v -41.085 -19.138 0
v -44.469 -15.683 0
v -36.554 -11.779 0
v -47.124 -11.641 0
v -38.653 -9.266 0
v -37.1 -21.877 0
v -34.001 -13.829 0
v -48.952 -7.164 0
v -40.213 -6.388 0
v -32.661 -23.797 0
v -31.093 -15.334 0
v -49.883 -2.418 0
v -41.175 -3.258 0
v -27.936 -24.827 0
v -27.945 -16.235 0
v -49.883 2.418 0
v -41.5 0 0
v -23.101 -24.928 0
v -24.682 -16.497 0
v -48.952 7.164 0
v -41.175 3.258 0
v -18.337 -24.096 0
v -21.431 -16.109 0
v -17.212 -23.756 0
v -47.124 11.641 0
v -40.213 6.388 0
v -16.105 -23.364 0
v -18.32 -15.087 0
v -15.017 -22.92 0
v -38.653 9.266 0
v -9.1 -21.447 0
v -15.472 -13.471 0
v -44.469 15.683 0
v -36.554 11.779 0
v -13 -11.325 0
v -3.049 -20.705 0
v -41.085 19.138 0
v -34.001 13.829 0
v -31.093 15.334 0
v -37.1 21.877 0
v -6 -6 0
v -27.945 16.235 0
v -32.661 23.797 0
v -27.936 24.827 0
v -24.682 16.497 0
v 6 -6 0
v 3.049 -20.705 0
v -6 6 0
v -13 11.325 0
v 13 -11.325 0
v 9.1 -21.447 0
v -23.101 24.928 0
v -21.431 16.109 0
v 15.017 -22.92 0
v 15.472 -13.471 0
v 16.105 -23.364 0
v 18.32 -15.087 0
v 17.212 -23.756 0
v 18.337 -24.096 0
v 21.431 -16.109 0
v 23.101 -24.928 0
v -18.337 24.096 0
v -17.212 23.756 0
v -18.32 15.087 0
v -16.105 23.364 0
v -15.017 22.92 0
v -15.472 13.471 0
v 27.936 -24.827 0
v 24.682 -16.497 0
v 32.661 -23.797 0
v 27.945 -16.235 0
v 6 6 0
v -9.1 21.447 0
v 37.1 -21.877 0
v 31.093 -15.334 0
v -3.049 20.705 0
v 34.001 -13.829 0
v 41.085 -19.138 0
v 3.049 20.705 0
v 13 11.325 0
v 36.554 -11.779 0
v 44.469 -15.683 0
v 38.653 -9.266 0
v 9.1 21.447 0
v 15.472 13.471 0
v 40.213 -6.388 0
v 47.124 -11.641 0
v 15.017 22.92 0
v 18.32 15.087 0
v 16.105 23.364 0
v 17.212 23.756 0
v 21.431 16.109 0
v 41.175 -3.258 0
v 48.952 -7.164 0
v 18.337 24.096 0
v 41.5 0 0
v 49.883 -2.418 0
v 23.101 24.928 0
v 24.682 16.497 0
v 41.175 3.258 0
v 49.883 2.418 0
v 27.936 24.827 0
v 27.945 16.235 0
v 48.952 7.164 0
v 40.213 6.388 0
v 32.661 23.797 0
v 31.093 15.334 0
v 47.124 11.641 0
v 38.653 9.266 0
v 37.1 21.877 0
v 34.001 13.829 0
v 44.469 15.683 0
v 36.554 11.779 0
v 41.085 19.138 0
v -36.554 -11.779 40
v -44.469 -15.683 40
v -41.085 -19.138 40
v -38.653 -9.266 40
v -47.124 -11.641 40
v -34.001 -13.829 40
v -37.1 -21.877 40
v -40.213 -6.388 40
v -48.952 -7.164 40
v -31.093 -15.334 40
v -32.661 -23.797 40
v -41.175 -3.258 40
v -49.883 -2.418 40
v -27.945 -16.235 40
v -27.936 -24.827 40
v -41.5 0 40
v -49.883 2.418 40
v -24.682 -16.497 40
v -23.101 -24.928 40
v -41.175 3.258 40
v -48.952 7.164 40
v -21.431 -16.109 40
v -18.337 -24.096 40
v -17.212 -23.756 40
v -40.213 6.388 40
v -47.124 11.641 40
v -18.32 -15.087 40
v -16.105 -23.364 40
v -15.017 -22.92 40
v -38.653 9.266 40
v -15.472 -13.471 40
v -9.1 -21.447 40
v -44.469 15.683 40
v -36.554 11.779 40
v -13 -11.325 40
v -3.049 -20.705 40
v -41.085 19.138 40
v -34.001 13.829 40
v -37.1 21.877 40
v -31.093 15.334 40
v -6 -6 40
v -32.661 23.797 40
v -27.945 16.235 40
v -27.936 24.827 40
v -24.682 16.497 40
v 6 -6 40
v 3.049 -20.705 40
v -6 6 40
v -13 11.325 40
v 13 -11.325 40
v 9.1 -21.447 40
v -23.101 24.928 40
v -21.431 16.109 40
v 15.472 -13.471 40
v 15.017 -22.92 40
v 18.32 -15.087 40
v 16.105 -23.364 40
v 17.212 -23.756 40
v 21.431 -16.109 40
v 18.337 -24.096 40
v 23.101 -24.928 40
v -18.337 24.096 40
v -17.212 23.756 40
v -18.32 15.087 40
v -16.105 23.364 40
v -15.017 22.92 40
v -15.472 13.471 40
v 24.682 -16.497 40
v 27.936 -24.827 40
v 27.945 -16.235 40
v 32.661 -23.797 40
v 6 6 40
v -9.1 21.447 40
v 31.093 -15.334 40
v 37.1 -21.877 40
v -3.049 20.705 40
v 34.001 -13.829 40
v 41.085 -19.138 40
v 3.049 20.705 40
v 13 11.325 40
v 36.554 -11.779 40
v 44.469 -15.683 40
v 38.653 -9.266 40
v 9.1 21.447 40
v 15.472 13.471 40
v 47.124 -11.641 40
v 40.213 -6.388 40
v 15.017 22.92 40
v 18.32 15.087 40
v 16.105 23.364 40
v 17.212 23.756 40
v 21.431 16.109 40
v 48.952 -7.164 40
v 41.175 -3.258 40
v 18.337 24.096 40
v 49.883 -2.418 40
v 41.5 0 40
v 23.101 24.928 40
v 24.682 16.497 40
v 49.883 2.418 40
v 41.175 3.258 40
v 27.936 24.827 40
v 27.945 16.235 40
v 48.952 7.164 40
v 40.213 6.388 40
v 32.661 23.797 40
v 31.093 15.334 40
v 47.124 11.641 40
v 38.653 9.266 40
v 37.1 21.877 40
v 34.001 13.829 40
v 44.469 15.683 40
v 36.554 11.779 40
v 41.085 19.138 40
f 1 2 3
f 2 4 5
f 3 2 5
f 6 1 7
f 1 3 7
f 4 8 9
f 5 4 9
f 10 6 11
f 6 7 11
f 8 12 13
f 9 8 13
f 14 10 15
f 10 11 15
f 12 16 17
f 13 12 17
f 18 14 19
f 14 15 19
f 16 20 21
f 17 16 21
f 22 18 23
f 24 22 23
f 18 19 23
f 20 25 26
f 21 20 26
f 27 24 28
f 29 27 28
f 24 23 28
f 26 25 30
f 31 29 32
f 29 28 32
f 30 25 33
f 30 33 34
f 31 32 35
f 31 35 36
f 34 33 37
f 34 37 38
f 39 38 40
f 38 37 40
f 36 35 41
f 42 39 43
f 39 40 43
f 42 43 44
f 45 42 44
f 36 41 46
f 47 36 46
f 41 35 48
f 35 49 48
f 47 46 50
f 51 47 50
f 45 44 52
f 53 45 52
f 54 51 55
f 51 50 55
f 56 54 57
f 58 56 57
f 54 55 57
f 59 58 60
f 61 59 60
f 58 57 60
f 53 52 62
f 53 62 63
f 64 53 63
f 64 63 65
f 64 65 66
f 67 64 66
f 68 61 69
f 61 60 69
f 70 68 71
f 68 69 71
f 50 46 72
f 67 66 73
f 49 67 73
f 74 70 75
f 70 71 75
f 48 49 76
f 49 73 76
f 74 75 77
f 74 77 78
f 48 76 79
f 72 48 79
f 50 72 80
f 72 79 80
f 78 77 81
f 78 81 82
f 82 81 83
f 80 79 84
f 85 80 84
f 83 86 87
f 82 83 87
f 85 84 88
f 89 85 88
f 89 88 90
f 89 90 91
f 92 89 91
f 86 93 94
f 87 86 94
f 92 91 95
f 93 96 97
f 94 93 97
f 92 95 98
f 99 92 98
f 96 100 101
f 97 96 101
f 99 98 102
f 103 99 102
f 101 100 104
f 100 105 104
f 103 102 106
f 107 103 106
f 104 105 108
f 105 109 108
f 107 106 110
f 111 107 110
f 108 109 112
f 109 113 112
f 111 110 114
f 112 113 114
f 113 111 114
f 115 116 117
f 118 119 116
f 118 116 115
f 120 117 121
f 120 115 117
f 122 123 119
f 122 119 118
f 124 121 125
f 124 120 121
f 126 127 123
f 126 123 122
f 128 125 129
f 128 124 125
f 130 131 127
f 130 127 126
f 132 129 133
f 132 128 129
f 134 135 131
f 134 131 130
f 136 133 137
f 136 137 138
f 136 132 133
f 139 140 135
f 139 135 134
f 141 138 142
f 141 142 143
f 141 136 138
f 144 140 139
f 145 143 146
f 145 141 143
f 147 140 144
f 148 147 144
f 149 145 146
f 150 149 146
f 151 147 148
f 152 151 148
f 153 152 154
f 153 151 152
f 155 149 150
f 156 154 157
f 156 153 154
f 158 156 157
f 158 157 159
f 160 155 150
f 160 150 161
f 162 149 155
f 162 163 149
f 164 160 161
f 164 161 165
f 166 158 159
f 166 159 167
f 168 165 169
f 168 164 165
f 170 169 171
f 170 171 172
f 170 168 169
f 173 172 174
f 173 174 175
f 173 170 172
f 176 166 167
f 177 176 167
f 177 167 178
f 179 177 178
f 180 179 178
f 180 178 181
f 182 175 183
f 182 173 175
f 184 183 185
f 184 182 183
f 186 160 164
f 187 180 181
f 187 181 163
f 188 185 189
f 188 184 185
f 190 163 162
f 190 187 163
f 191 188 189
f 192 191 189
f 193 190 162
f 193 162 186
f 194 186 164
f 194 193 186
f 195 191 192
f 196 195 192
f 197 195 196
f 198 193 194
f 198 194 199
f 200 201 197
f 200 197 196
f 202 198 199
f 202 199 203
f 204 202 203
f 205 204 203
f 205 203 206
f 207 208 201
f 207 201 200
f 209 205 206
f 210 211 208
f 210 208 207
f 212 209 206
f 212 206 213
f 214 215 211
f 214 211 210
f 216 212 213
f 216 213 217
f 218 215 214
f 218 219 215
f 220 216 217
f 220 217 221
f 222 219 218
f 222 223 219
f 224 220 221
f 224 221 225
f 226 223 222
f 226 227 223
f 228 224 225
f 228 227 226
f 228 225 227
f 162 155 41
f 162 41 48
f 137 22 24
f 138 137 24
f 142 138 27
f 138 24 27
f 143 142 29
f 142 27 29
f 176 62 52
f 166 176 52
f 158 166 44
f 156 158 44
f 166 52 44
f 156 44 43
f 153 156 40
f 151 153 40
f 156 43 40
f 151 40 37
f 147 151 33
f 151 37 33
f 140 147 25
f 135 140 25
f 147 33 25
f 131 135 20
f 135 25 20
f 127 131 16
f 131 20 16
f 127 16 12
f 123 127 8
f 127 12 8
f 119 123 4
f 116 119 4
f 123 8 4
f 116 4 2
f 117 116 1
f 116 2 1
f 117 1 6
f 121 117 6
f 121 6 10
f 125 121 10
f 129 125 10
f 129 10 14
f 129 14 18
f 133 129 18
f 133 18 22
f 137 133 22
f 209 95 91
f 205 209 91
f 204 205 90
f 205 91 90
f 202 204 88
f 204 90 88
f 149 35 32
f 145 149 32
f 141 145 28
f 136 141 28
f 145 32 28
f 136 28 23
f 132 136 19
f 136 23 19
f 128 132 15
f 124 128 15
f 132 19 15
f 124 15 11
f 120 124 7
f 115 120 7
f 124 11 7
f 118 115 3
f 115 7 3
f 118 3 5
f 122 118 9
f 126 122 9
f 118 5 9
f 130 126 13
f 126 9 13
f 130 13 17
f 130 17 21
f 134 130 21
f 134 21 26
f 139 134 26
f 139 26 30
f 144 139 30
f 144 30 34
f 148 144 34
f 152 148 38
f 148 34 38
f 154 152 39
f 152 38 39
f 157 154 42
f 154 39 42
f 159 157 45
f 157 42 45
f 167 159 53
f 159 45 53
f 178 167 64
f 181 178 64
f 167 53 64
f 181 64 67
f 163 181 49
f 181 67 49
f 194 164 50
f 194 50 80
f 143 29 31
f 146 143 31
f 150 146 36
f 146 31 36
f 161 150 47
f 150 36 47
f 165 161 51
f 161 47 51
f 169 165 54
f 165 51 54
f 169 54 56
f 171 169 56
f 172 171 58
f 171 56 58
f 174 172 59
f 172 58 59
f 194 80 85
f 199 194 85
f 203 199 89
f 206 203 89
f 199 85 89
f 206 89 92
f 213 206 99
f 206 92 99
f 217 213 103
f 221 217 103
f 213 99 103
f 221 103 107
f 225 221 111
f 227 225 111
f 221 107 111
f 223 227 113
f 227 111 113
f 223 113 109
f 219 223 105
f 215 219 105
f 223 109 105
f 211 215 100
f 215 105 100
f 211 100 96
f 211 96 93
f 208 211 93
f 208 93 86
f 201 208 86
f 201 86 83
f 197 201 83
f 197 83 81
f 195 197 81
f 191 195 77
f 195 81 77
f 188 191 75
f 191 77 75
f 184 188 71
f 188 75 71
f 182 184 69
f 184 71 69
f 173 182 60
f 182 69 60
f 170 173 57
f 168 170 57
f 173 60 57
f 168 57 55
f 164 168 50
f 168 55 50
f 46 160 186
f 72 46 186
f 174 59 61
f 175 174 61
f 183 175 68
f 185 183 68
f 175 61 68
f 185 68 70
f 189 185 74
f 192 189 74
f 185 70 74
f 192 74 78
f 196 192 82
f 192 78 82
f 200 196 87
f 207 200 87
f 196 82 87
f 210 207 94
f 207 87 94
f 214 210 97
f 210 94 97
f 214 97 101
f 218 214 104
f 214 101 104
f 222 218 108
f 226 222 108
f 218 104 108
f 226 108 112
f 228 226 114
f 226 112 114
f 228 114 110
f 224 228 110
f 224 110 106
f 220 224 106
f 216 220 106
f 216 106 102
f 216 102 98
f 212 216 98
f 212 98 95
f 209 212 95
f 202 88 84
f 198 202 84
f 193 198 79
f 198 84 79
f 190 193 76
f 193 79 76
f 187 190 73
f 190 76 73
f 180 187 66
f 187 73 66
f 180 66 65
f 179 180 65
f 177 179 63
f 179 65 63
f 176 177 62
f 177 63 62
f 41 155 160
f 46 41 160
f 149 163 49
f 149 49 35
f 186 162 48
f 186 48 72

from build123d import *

# Parameters (mm, degrees)
F0_W     = 12
F0_H     = 12
F1_DEPTH = 40


with BuildPart() as f1:
    # F0 (on Top) → F1 (new body)
    with BuildSketch(Plane.XY):
        with BuildLine():
            ThreePointArc((-18.337186, 24.095786), (-16.687389, 23.478766), (-15.016882, 22.920239))
            ThreePointArc((-15.016882, 22.920239), (-16.656306, 23.56656), (-18.337186, 24.095786))
        make_face()
        with BuildLine():
            ThreePointArc((15.016882, 22.920239), (0, 20.611887), (-15.016882, 22.920239))
            ThreePointArc((-15.016882, 22.920239), (-16.687389, 23.478766), (-18.337186, 24.095786))
            ThreePointArc((-18.337186, 24.095786), (-50, 0), (-18.337186, -24.095786))
            ThreePointArc((-18.337186, -24.095786), (-16.687389, -23.478766), (-15.016882, -22.920239))
            ThreePointArc((-15.016882, -22.920239), (0, -20.611887), (15.016882, -22.920239))
            ThreePointArc((15.016882, -22.920239), (16.687389, -23.478766), (18.337186, -24.095786))
            ThreePointArc((18.337186, -24.095786), (50, 0), (18.337186, 24.095786))
            ThreePointArc((18.337186, 24.095786), (16.687389, 23.478766), (15.016882, 22.920239))
        make_face()
        with BuildLine():
            ThreePointArc((-13, -11.324752), (-41.5, 0), (-13, 11.324752))
            Line((-13, 11.324752), (-13, -11.324752))
        make_face(mode=Mode.SUBTRACT)
        Rectangle(F0_W, F0_H, mode=Mode.SUBTRACT)
        with BuildLine():
            Line((13, -11.324752), (13, 11.324752))
            ThreePointArc((13, 11.324752), (41.5, 0), (13, -11.324752))
        make_face(mode=Mode.SUBTRACT)
        with BuildLine():
            ThreePointArc((18.337186, 24.095786), (16.656306, 23.56656), (15.016882, 22.920239))
            ThreePointArc((15.016882, 22.920239), (16.687389, 23.478766), (18.337186, 24.095786))
        make_face()
        with BuildLine():
            ThreePointArc((-15.016882, -22.920239), (-16.687389, -23.478766), (-18.337186, -24.095786))
            ThreePointArc((-18.337186, -24.095786), (-16.656306, -23.56656), (-15.016882, -22.920239))
        make_face()
        with BuildLine():
            ThreePointArc((15.016882, -22.920239), (16.656306, -23.56656), (18.337186, -24.095786))
            ThreePointArc((18.337186, -24.095786), (16.687389, -23.478766), (15.016882, -22.920239))
        make_face()
    extrude(amount=F1_DEPTH)


solid = f1.part
